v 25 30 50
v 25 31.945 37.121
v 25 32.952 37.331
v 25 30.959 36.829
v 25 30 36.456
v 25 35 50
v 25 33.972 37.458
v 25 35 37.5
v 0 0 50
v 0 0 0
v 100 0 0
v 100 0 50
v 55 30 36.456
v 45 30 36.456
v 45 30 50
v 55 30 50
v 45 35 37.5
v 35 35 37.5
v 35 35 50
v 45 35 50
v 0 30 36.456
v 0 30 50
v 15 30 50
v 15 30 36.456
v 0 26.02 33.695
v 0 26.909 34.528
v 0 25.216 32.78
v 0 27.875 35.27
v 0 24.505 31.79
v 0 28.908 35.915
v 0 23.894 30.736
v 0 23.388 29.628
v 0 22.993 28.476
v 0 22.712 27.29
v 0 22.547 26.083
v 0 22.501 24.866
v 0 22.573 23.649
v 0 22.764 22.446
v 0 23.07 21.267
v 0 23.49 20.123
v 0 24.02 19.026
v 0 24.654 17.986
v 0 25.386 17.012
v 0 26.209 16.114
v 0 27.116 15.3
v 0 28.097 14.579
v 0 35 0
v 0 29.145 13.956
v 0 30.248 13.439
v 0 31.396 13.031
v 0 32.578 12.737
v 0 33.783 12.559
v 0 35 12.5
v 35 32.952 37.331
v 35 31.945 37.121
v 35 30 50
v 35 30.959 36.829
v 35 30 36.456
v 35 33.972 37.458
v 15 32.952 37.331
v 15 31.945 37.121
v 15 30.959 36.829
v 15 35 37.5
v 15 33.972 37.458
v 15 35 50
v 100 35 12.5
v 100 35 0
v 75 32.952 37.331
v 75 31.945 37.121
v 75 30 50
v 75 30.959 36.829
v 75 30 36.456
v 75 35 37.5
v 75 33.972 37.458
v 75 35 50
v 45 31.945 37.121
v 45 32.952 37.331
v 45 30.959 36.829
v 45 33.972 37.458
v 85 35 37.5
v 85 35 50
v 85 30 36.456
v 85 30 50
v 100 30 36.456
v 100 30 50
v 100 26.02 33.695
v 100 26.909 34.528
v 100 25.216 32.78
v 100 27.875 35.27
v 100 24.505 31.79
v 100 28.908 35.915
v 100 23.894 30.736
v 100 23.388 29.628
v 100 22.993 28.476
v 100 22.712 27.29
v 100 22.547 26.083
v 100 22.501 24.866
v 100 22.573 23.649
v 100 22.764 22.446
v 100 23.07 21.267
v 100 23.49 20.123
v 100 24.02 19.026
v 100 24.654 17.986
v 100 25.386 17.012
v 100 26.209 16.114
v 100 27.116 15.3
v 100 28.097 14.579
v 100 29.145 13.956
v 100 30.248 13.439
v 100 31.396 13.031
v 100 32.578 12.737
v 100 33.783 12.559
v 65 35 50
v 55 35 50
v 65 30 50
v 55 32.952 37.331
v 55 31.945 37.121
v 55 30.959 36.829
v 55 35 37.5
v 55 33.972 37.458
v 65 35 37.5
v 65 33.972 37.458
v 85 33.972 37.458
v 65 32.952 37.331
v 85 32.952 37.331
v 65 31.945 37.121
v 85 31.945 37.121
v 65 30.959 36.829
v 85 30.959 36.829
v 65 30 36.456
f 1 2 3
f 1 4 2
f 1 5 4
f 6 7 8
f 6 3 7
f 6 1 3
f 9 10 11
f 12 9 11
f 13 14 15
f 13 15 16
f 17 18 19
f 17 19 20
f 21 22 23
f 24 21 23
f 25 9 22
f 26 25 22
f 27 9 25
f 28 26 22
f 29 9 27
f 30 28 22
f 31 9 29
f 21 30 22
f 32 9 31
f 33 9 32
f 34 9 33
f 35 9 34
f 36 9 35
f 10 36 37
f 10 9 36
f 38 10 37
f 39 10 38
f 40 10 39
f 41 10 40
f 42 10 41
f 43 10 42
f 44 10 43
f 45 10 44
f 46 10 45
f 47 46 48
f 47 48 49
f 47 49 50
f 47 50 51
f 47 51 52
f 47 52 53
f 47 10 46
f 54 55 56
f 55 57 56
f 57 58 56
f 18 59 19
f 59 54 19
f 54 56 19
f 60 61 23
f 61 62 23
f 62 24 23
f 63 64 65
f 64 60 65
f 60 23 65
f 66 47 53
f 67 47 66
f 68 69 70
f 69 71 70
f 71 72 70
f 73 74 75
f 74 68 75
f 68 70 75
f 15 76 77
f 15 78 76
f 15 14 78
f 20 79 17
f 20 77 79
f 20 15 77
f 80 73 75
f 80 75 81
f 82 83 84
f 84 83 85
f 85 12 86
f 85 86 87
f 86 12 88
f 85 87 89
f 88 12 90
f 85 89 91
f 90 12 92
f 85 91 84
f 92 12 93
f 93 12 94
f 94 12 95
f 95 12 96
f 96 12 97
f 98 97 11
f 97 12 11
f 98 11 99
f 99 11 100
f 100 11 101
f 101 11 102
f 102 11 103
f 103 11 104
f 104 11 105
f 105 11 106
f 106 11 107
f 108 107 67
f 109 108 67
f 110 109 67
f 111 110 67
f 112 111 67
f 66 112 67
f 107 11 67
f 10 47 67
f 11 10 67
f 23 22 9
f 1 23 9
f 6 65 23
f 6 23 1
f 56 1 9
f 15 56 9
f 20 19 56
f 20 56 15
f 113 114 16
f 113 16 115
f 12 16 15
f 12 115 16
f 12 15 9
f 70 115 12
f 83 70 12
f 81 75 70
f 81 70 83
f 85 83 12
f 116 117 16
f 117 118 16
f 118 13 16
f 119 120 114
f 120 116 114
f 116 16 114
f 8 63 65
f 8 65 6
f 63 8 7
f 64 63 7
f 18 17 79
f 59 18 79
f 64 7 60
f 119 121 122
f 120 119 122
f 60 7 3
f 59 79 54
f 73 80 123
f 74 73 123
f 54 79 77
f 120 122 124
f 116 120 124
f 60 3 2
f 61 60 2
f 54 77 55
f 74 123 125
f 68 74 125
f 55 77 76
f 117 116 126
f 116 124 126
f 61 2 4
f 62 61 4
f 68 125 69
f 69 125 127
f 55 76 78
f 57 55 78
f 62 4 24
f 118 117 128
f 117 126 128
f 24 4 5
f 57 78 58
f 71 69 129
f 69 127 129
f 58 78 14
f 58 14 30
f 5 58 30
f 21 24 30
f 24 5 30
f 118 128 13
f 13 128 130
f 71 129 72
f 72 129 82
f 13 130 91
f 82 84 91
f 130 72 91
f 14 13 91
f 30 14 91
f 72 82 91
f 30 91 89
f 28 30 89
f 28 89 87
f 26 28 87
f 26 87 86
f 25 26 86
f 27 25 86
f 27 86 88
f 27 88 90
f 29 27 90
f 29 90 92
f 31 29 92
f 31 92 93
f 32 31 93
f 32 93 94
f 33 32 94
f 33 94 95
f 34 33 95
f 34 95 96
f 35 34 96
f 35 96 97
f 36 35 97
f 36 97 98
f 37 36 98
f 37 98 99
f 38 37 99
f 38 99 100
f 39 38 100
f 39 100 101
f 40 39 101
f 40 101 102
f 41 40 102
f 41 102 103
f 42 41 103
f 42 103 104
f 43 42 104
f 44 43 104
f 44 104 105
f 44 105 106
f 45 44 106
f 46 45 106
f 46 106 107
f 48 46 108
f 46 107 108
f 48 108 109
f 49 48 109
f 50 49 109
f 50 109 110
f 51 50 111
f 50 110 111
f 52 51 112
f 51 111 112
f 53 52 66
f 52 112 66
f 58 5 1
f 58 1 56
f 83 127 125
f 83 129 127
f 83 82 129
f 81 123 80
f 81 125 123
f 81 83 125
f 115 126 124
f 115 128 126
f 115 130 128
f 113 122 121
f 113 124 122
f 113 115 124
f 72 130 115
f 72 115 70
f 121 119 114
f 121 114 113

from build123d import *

# Parameters (mm, degrees)
SKETCH1_W           = 100
SKETCH1_H           = 35
BOSS_EXTRUDE1_DEPTH = 50
SKETCH4_R           = 12.5
CUT_EXTRUDE2_DEPTH  = 100
SKETCH5_W           = 15
SKETCH5_H           = 5
SKETCH5_W_2         = 10
CUT_EXTRUDE3_DEPTH  = 25


with BuildPart() as part:
    # Sketch1 → Boss-Extrude1 (new body)
    with BuildSketch(Plane.XY):
        with Locations((50, 17.5)):
            Rectangle(SKETCH1_W, SKETCH1_H)
    extrude(amount=BOSS_EXTRUDE1_DEPTH)

    # Sketch4 → Cut-Extrude2 (cut)
    with BuildSketch(Plane(origin=(100, 0, 0), x_dir=(0, 0, -1), z_dir=(1, 0, 0))):
        with Locations((-25, 35)):
            Circle(SKETCH4_R)
    extrude(amount=-CUT_EXTRUDE2_DEPTH, mode=Mode.SUBTRACT)

    # Sketch5 → Cut-Extrude3 (cut)
    with BuildSketch(Plane.XY.offset(50)):
        with Locations((7.5, 32.5)):
            Rectangle(SKETCH5_W, SKETCH5_H)
        with Locations((30, 32.5)):
            Rectangle(SKETCH5_W_2, SKETCH5_H)
        with Locations((70, 32.5)):
            Rectangle(SKETCH5_W_2, SKETCH5_H)
        with Locations((92.5, 32.5)):
            Rectangle(SKETCH5_W, SKETCH5_H)
        with Locations((50, 32.5)):
            Rectangle(SKETCH5_W_2, SKETCH5_H)
    extrude(amount=-CUT_EXTRUDE3_DEPTH, mode=Mode.SUBTRACT)


solid = part.part
